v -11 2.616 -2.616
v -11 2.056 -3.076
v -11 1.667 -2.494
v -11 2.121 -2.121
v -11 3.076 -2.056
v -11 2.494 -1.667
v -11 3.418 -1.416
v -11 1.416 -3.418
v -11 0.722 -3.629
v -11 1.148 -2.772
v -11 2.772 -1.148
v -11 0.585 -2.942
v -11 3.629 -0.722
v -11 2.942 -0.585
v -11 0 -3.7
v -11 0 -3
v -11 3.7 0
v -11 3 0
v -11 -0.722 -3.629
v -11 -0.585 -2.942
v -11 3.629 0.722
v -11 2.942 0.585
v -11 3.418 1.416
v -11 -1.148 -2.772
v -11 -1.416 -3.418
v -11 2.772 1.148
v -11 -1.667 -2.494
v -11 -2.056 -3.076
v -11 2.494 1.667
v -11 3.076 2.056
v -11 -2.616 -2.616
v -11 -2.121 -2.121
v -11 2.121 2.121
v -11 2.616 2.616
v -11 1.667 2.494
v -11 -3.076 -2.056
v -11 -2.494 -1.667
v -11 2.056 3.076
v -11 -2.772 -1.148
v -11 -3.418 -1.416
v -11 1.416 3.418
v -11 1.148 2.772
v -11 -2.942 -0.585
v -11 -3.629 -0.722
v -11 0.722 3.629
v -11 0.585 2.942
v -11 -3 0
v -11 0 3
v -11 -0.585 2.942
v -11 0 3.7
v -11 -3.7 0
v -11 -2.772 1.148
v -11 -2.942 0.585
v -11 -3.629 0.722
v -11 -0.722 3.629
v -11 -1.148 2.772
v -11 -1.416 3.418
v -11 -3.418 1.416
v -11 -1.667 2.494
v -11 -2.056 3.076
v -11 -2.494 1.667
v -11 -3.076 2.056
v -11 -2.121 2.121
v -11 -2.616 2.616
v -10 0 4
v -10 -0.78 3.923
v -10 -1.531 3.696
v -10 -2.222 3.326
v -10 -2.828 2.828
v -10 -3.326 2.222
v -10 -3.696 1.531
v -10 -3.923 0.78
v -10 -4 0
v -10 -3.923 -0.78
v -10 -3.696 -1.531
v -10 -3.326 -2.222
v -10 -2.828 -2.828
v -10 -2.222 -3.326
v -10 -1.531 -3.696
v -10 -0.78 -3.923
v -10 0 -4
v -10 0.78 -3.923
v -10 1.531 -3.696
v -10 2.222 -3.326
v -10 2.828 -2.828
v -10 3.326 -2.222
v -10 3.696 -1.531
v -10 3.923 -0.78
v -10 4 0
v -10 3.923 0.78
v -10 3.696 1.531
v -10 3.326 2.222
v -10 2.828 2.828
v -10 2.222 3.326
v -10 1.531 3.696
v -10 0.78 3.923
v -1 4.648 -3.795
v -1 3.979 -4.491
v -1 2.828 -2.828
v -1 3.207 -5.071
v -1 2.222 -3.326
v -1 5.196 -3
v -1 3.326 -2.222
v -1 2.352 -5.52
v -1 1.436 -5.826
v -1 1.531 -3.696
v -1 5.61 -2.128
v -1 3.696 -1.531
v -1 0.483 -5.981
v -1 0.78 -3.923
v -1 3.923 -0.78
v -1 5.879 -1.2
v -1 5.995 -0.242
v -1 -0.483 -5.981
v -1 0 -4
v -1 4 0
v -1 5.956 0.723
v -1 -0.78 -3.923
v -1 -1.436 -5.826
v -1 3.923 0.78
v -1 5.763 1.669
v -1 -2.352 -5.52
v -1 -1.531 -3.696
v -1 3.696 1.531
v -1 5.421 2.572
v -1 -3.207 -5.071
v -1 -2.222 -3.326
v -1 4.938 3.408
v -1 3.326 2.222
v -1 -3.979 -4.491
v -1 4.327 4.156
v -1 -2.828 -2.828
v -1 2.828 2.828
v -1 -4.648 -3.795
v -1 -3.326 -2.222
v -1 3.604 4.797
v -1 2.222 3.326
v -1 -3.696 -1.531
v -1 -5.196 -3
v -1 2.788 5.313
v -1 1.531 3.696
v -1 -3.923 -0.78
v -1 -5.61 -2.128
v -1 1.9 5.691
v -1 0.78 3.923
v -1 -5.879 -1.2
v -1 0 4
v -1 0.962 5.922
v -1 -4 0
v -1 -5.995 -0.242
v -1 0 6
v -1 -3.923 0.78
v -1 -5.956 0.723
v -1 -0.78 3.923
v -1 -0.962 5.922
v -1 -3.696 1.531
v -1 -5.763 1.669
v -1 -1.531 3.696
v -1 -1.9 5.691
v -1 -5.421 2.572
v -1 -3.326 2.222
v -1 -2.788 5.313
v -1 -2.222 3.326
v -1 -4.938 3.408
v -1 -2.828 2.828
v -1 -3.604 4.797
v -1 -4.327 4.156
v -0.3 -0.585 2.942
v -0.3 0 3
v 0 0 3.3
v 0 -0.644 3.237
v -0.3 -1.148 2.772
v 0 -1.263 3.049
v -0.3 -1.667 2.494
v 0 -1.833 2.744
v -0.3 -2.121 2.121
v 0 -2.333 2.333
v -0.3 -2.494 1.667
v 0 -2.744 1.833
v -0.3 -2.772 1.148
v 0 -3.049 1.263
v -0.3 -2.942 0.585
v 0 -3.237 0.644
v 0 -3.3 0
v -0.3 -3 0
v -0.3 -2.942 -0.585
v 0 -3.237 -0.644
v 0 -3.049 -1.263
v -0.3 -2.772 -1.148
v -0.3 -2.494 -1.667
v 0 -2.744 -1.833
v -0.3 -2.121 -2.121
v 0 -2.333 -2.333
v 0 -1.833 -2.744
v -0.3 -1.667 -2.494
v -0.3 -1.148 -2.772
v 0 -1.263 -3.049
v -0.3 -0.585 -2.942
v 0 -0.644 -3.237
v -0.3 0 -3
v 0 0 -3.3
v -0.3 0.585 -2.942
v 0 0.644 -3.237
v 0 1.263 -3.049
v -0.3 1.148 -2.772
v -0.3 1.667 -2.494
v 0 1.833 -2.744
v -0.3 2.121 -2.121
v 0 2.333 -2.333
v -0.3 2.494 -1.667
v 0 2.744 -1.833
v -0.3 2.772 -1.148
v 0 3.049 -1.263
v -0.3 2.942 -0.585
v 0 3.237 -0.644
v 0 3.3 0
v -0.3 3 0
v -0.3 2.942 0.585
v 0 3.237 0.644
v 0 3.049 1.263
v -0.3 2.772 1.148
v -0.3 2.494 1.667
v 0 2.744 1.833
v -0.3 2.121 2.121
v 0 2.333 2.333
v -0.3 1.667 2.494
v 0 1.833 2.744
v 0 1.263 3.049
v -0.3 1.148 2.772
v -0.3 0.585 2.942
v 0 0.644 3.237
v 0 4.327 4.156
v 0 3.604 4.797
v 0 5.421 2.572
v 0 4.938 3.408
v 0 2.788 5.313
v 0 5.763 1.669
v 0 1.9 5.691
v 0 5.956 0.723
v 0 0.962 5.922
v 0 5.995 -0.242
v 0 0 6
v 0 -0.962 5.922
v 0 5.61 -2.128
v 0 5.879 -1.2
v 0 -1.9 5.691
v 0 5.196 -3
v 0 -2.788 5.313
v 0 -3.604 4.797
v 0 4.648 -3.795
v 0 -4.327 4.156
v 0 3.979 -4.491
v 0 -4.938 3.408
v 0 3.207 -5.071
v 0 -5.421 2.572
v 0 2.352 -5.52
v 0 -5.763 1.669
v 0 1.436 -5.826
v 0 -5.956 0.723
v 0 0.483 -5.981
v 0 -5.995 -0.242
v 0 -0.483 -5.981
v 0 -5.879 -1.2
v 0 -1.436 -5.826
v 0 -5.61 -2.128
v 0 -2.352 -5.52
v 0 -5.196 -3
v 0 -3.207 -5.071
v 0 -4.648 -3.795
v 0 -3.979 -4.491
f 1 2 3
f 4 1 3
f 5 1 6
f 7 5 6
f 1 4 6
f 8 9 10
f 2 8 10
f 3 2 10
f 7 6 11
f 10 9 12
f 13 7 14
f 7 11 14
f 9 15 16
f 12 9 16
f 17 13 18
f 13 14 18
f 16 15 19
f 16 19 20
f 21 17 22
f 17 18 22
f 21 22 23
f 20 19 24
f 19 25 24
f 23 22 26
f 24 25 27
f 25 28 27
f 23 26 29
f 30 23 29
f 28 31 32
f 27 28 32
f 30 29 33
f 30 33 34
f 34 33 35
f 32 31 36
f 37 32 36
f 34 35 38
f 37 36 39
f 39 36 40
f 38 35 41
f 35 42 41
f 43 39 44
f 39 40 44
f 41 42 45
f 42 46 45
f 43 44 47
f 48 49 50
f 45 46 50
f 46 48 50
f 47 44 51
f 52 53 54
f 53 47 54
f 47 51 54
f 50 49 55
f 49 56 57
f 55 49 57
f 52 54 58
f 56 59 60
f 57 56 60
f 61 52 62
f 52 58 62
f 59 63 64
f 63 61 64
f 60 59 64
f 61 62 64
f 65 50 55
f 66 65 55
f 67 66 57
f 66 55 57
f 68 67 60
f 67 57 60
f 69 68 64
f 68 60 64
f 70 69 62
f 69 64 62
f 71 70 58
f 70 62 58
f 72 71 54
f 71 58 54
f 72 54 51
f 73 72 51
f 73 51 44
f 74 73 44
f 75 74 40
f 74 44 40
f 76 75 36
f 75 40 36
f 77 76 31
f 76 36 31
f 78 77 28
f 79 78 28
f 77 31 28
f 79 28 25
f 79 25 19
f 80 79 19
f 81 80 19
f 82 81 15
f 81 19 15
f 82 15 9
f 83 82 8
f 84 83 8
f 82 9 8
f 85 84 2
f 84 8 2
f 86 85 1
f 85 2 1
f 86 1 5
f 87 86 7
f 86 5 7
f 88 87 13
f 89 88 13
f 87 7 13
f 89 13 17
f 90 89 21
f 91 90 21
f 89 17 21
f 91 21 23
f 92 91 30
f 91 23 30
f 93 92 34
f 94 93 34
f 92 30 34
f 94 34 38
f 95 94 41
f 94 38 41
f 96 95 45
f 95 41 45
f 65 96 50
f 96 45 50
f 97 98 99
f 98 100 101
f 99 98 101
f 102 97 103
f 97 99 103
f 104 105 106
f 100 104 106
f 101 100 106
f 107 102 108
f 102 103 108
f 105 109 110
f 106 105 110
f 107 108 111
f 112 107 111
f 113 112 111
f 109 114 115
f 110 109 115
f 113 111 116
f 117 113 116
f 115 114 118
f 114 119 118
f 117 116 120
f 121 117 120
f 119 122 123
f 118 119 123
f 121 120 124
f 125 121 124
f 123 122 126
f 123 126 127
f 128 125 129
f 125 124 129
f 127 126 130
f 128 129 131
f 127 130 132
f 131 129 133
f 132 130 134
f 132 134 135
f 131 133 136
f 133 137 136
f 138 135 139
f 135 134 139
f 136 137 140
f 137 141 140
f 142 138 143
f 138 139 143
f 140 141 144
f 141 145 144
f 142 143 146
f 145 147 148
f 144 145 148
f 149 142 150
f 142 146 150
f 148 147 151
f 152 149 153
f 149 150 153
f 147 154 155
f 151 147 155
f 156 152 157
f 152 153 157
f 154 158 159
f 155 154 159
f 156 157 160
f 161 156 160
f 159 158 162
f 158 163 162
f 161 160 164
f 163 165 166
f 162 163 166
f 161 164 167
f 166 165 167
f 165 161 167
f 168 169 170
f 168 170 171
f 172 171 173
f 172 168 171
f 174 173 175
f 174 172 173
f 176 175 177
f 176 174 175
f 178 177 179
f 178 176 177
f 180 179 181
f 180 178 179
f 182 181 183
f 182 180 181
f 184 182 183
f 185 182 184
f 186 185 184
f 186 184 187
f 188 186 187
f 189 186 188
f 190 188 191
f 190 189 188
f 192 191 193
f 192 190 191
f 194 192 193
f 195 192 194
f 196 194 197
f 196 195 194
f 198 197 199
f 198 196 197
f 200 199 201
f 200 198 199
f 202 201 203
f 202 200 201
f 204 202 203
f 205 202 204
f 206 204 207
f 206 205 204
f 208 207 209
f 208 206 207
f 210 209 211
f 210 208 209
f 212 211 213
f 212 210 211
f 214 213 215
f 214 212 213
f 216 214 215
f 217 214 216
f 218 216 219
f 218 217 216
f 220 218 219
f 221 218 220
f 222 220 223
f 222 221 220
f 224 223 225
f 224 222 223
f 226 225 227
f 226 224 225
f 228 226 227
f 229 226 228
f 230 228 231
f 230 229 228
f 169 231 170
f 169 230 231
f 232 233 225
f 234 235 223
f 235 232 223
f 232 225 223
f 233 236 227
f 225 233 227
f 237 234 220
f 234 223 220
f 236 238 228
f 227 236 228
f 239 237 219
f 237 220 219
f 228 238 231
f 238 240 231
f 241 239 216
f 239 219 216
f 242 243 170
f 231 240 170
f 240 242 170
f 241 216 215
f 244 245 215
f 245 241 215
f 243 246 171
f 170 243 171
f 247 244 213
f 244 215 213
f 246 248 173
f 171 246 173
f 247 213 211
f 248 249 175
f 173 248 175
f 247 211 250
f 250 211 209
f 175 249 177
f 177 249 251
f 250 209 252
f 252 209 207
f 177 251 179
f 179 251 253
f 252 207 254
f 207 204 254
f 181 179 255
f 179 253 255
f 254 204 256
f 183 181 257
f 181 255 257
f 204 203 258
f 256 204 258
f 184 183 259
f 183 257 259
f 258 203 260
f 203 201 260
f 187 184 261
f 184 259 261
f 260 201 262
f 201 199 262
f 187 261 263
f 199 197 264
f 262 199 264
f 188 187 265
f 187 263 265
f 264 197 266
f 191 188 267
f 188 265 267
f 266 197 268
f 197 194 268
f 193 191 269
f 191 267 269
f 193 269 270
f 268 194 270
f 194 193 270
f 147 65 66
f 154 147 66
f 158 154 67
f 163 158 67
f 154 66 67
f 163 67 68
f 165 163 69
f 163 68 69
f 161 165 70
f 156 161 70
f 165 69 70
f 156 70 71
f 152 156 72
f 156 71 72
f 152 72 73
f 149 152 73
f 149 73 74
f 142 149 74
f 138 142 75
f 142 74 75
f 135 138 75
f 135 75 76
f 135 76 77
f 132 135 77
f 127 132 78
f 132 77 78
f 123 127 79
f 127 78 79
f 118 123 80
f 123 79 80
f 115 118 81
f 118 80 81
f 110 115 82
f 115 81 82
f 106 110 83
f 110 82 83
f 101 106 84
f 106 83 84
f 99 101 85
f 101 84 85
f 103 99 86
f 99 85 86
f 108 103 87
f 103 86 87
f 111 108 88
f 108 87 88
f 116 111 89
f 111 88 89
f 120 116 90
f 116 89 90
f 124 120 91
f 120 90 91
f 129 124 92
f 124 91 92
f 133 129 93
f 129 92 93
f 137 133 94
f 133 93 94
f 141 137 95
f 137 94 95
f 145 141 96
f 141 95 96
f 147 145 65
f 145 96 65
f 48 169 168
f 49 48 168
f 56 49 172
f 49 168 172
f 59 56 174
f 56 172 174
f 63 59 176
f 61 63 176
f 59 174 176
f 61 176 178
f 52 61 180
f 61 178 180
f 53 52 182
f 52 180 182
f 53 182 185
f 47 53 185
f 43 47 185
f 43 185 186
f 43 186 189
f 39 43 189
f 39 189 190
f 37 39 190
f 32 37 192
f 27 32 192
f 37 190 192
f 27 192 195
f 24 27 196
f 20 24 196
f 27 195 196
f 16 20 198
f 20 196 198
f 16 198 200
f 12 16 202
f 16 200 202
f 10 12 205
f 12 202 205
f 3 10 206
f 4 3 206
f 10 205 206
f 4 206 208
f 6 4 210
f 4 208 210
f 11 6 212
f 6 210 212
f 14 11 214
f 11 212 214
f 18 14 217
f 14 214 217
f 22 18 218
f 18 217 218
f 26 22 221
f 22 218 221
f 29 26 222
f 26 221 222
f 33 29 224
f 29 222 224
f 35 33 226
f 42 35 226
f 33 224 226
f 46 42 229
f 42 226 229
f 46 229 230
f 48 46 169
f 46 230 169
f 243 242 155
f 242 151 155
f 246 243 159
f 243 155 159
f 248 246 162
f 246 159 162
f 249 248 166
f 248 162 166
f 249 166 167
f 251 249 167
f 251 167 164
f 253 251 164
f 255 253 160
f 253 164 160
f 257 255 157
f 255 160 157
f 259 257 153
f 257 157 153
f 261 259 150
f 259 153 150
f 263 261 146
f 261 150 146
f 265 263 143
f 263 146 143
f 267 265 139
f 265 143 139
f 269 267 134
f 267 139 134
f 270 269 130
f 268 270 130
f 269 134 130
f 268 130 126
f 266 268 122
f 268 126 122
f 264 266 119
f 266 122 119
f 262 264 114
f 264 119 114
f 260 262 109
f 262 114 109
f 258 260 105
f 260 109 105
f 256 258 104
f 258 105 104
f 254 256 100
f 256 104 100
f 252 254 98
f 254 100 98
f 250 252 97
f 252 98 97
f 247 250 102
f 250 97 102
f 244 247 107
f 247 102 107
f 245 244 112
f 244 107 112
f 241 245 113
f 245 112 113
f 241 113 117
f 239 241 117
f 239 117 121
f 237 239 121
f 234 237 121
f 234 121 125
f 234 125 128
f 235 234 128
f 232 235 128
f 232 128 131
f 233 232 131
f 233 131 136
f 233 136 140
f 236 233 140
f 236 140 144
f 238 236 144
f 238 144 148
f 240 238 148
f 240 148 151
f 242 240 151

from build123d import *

# Parameters (mm, degrees)
CHAMFER_1_SIZE  = 0.3
CHAMFER_2_SIZE  = 1
CHAMFER_2_SIZE2 = 0.3


with BuildPart() as part:
    # ｽｹｯﾁ1 → 回転1 (revolve)
    with BuildSketch(Plane.XY, mode=Mode.PRIVATE) as revolve_1_sk:
        Polygon((0, 3), (0, 6), (-1, 6), (-1, 4), (-11, 4), (-11, 3), align=None)
    revolve(revolve_1_sk.sketch.rotate(Axis((0, 0, 0), (1, 0, 0)), 90), axis=Axis((0, 0, 0), (1, 0, 0)))

    # 面取り1
    chamfer_1_edges = [part.edges().sort_by_distance(p)[0] for p in [
        (0, 0, -3),
    ]]
    chamfer(chamfer_1_edges, length=CHAMFER_1_SIZE)

    # 面取り2
    chamfer_2_edges = [part.edges().sort_by_distance(p)[0] for p in [
        (-11, 0, -4),
    ]]
    chamfer_2_side = [part.faces().sort_by_distance(p)[0] for p in [
        (-6, 0, -4),
    ]]
    chamfer(chamfer_2_edges, length=CHAMFER_2_SIZE, length2=CHAMFER_2_SIZE2, reference=chamfer_2_side[0])


solid = part.part
